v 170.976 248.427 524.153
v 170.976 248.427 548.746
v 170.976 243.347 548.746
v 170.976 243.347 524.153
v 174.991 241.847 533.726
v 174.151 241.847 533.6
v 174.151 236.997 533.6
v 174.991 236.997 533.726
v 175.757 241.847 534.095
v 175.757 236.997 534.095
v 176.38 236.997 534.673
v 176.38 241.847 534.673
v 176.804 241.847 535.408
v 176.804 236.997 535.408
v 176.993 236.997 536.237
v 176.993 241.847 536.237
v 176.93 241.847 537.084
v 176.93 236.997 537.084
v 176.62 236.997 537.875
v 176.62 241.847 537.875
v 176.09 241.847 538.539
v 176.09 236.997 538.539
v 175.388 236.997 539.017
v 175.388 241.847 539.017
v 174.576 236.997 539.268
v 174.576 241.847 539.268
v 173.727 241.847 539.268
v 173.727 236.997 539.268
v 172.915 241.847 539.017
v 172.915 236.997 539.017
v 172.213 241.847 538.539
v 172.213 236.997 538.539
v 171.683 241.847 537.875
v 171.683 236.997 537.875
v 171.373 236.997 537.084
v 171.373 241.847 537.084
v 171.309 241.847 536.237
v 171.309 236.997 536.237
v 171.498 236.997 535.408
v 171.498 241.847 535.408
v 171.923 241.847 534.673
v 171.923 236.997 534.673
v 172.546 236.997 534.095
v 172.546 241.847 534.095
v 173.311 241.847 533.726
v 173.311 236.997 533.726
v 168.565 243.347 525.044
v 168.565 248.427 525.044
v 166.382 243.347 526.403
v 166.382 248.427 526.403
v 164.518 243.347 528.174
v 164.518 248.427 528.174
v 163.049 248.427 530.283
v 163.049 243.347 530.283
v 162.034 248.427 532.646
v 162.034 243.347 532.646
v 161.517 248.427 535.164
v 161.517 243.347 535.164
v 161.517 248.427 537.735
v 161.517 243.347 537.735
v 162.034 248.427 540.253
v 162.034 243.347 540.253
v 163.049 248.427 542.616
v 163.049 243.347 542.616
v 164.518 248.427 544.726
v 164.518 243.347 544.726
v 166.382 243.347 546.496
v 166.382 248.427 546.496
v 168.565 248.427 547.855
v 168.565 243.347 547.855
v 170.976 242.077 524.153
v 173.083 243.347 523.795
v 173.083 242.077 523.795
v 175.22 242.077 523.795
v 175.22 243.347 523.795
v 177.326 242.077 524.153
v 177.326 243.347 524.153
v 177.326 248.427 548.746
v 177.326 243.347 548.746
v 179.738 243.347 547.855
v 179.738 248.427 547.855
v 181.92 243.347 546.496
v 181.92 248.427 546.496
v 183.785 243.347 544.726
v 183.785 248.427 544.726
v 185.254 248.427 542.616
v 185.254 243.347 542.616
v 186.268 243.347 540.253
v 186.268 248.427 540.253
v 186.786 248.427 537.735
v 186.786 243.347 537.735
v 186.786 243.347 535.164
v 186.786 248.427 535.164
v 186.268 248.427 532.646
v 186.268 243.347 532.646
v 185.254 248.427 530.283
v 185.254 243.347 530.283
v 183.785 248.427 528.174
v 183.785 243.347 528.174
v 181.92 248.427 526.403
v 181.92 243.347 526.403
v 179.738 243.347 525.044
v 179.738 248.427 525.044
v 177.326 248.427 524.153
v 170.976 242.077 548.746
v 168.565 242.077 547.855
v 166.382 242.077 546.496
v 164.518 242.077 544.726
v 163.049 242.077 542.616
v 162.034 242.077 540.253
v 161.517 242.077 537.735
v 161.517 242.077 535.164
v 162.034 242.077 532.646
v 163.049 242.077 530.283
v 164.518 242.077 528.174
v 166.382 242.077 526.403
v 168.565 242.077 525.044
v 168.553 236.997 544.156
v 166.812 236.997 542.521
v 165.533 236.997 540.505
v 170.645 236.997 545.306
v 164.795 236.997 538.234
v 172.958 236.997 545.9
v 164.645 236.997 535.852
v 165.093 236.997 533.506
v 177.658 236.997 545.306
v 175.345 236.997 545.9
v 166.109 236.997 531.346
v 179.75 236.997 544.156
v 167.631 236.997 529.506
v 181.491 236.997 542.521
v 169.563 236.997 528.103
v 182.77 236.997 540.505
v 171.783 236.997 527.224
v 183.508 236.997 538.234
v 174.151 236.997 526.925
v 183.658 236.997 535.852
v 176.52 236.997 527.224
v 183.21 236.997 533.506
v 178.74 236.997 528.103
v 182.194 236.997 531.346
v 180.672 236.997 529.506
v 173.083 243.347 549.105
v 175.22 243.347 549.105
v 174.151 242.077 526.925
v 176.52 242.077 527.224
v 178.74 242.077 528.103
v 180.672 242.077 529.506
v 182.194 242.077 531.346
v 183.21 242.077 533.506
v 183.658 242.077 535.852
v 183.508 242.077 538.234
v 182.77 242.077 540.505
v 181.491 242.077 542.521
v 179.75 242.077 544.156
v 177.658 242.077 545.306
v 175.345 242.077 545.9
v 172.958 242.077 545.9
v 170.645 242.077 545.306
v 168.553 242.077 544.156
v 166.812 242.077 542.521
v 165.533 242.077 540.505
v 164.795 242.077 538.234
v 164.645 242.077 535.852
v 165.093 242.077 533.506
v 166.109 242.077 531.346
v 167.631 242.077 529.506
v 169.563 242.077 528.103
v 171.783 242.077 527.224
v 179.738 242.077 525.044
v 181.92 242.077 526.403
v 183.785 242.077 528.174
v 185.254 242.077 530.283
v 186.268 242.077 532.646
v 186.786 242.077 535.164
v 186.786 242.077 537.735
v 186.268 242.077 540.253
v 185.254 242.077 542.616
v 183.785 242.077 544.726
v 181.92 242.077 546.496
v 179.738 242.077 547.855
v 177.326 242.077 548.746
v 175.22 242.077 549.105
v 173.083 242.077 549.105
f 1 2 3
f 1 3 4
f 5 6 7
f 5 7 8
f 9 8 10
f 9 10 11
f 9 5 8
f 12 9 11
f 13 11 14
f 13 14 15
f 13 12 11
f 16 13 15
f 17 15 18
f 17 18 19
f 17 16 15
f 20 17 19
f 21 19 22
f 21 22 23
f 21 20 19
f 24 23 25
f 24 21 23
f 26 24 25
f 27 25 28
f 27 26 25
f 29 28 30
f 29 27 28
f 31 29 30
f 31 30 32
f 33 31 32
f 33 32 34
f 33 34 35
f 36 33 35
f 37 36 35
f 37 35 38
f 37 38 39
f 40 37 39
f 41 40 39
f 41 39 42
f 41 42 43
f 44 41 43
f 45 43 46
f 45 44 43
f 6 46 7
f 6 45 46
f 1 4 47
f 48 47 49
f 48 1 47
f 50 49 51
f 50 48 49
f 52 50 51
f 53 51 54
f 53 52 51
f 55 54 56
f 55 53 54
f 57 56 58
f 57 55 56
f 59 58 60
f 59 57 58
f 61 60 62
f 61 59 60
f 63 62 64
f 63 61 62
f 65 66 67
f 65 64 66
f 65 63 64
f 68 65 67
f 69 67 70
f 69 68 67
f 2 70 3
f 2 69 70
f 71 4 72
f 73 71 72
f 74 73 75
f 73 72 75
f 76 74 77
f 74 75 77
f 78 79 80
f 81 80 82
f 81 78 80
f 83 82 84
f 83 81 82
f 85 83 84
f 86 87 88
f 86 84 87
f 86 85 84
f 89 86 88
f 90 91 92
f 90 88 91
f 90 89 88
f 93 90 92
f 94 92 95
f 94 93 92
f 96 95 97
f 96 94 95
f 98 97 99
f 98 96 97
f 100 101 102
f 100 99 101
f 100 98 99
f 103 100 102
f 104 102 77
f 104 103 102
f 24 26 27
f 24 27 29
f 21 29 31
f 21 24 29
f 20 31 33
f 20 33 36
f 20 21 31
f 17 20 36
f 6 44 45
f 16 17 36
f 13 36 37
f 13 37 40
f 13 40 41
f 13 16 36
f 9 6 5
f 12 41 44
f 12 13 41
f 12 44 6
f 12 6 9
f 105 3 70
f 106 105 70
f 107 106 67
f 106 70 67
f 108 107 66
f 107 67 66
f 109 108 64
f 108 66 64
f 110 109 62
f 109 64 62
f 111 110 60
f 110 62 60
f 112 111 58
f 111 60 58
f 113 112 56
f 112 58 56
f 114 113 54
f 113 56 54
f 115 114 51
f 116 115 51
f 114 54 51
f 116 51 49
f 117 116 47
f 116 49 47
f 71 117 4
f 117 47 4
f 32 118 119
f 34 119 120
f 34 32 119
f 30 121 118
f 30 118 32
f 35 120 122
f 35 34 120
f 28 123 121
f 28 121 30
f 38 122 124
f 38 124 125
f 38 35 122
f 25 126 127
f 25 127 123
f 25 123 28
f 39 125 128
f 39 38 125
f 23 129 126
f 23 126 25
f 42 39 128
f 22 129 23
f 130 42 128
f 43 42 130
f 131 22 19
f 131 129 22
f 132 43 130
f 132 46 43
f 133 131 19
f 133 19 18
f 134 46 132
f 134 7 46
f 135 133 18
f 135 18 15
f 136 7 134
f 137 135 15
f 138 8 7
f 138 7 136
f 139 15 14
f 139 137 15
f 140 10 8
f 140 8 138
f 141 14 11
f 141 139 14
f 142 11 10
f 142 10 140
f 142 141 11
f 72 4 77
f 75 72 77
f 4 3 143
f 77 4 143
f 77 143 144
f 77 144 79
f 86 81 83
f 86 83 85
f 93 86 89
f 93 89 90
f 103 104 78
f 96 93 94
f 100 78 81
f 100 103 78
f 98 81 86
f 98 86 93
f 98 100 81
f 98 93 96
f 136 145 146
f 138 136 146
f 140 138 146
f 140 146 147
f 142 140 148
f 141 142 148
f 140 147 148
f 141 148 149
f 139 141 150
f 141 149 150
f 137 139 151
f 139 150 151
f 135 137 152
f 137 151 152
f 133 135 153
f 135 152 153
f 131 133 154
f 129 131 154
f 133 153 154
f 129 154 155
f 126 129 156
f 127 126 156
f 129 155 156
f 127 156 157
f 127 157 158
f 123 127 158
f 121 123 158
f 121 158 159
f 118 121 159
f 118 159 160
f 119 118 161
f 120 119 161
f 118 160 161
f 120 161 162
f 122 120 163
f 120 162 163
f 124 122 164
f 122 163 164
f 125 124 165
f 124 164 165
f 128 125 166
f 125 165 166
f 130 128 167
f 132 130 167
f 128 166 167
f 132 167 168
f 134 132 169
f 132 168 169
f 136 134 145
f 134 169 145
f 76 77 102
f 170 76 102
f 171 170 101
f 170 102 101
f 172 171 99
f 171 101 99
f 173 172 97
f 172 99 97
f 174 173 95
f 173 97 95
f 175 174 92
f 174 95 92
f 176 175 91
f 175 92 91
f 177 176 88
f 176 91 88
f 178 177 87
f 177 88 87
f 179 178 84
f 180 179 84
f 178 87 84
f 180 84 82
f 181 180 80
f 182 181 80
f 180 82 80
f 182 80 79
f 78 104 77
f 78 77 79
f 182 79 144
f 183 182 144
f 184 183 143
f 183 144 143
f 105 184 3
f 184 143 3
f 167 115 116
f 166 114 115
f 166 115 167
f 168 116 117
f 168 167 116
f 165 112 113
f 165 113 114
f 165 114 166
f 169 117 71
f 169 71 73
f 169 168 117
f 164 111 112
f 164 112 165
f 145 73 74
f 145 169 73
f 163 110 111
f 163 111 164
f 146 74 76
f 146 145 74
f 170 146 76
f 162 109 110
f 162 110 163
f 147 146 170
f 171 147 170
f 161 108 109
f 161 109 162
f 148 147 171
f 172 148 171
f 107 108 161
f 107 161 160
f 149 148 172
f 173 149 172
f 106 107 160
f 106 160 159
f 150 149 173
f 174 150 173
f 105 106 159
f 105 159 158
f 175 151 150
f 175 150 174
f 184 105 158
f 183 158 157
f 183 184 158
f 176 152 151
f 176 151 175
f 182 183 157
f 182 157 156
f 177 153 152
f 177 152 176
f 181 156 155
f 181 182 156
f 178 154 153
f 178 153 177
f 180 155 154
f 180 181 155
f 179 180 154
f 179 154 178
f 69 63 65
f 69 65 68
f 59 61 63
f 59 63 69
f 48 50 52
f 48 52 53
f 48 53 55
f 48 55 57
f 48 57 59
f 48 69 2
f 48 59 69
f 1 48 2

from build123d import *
from build123d.topology import SkipClean

# Parameters (mm, degrees)
BOSS_EXTRUDE1_DEPTH = 1.27
BOSS_EXTRUDE2_START = 5.08
BOSS_EXTRUDE2_DEPTH = 5.08
SKETCH3_R           = 9.525
BOSS_EXTRUDE3_DEPTH = 5.08
CUT_EXTRUDE2_START  = -4.85
SKETCH7_R           = 2.85
CUT_EXTRUDE2_DEPTH  = 4.85


with BuildPart() as part:
    # Sketch1 → Boss-Extrude1 (new body)
    with BuildSketch(Plane.XZ.offset(-243.34664948)):
        with BuildLine():
            ThreePointArc((170.976440709, 548.746338149), (161.451440709, 536.449616024), (170.976440709, 524.1528939))
            ThreePointArc((170.976440709, 524.1528939), (174.151440709, 523.749616024), (177.326440709, 524.1528939))
            ThreePointArc((177.326440709, 524.1528939), (186.851440709, 536.449616024), (177.326440709, 548.746338149))
            ThreePointArc((177.326440709, 548.746338149), (174.151440709, 549.149616024), (170.976440709, 548.746338149))
        make_face()
    extrude(amount=BOSS_EXTRUDE1_DEPTH)

    # Sketch2 → Boss-Extrude2 (add)
    with SkipClean():  # the faces are left unmerged after this step: merging them gives an invalid solid
        with BuildSketch(Plane(origin=(0, 243.34664948, 0), x_dir=(1, 0, 0), z_dir=(0, 1, 0)).offset(BOSS_EXTRUDE2_START)):
            with BuildLine():
                Line((177.326440709, -524.1528939), (177.326440709, -548.746338149))
                ThreePointArc((177.326440709, -548.746338149), (186.851440709, -536.449616024), (177.326440709, -524.1528939))
            make_face()
            with BuildLine():
                Line((170.976440709, -548.746338149), (170.976440709, -524.1528939))
                ThreePointArc((170.976440709, -524.1528939), (161.451440709, -536.449616024), (170.976440709, -548.746338149))
            make_face()
        extrude(amount=-BOSS_EXTRUDE2_DEPTH)

    # Sketch3 → Boss-Extrude3 (add)
    with SkipClean():  # the faces are left unmerged after this step: merging them gives an invalid solid
        with BuildSketch(Plane.XZ.offset(-242.07664948)):
            with Locations(Location((174.151440709, 536.449616024, 0), (0, 0, 270))):
                Circle(SKETCH3_R)
        extrude(amount=BOSS_EXTRUDE3_DEPTH)

    # Sketch7 → Cut-Extrude2 (cut)
    with SkipClean():  # the faces are left unmerged after this step: merging them gives an invalid solid
        with BuildSketch(Plane.XZ.offset(-236.99664948).offset(CUT_EXTRUDE2_START)):
            with Locations(Location((174.151440709, 536.449616024, 0), (0, 0, 270))):
                Circle(SKETCH7_R)
        extrude(amount=CUT_EXTRUDE2_DEPTH, mode=Mode.SUBTRACT)


solid = part.part
